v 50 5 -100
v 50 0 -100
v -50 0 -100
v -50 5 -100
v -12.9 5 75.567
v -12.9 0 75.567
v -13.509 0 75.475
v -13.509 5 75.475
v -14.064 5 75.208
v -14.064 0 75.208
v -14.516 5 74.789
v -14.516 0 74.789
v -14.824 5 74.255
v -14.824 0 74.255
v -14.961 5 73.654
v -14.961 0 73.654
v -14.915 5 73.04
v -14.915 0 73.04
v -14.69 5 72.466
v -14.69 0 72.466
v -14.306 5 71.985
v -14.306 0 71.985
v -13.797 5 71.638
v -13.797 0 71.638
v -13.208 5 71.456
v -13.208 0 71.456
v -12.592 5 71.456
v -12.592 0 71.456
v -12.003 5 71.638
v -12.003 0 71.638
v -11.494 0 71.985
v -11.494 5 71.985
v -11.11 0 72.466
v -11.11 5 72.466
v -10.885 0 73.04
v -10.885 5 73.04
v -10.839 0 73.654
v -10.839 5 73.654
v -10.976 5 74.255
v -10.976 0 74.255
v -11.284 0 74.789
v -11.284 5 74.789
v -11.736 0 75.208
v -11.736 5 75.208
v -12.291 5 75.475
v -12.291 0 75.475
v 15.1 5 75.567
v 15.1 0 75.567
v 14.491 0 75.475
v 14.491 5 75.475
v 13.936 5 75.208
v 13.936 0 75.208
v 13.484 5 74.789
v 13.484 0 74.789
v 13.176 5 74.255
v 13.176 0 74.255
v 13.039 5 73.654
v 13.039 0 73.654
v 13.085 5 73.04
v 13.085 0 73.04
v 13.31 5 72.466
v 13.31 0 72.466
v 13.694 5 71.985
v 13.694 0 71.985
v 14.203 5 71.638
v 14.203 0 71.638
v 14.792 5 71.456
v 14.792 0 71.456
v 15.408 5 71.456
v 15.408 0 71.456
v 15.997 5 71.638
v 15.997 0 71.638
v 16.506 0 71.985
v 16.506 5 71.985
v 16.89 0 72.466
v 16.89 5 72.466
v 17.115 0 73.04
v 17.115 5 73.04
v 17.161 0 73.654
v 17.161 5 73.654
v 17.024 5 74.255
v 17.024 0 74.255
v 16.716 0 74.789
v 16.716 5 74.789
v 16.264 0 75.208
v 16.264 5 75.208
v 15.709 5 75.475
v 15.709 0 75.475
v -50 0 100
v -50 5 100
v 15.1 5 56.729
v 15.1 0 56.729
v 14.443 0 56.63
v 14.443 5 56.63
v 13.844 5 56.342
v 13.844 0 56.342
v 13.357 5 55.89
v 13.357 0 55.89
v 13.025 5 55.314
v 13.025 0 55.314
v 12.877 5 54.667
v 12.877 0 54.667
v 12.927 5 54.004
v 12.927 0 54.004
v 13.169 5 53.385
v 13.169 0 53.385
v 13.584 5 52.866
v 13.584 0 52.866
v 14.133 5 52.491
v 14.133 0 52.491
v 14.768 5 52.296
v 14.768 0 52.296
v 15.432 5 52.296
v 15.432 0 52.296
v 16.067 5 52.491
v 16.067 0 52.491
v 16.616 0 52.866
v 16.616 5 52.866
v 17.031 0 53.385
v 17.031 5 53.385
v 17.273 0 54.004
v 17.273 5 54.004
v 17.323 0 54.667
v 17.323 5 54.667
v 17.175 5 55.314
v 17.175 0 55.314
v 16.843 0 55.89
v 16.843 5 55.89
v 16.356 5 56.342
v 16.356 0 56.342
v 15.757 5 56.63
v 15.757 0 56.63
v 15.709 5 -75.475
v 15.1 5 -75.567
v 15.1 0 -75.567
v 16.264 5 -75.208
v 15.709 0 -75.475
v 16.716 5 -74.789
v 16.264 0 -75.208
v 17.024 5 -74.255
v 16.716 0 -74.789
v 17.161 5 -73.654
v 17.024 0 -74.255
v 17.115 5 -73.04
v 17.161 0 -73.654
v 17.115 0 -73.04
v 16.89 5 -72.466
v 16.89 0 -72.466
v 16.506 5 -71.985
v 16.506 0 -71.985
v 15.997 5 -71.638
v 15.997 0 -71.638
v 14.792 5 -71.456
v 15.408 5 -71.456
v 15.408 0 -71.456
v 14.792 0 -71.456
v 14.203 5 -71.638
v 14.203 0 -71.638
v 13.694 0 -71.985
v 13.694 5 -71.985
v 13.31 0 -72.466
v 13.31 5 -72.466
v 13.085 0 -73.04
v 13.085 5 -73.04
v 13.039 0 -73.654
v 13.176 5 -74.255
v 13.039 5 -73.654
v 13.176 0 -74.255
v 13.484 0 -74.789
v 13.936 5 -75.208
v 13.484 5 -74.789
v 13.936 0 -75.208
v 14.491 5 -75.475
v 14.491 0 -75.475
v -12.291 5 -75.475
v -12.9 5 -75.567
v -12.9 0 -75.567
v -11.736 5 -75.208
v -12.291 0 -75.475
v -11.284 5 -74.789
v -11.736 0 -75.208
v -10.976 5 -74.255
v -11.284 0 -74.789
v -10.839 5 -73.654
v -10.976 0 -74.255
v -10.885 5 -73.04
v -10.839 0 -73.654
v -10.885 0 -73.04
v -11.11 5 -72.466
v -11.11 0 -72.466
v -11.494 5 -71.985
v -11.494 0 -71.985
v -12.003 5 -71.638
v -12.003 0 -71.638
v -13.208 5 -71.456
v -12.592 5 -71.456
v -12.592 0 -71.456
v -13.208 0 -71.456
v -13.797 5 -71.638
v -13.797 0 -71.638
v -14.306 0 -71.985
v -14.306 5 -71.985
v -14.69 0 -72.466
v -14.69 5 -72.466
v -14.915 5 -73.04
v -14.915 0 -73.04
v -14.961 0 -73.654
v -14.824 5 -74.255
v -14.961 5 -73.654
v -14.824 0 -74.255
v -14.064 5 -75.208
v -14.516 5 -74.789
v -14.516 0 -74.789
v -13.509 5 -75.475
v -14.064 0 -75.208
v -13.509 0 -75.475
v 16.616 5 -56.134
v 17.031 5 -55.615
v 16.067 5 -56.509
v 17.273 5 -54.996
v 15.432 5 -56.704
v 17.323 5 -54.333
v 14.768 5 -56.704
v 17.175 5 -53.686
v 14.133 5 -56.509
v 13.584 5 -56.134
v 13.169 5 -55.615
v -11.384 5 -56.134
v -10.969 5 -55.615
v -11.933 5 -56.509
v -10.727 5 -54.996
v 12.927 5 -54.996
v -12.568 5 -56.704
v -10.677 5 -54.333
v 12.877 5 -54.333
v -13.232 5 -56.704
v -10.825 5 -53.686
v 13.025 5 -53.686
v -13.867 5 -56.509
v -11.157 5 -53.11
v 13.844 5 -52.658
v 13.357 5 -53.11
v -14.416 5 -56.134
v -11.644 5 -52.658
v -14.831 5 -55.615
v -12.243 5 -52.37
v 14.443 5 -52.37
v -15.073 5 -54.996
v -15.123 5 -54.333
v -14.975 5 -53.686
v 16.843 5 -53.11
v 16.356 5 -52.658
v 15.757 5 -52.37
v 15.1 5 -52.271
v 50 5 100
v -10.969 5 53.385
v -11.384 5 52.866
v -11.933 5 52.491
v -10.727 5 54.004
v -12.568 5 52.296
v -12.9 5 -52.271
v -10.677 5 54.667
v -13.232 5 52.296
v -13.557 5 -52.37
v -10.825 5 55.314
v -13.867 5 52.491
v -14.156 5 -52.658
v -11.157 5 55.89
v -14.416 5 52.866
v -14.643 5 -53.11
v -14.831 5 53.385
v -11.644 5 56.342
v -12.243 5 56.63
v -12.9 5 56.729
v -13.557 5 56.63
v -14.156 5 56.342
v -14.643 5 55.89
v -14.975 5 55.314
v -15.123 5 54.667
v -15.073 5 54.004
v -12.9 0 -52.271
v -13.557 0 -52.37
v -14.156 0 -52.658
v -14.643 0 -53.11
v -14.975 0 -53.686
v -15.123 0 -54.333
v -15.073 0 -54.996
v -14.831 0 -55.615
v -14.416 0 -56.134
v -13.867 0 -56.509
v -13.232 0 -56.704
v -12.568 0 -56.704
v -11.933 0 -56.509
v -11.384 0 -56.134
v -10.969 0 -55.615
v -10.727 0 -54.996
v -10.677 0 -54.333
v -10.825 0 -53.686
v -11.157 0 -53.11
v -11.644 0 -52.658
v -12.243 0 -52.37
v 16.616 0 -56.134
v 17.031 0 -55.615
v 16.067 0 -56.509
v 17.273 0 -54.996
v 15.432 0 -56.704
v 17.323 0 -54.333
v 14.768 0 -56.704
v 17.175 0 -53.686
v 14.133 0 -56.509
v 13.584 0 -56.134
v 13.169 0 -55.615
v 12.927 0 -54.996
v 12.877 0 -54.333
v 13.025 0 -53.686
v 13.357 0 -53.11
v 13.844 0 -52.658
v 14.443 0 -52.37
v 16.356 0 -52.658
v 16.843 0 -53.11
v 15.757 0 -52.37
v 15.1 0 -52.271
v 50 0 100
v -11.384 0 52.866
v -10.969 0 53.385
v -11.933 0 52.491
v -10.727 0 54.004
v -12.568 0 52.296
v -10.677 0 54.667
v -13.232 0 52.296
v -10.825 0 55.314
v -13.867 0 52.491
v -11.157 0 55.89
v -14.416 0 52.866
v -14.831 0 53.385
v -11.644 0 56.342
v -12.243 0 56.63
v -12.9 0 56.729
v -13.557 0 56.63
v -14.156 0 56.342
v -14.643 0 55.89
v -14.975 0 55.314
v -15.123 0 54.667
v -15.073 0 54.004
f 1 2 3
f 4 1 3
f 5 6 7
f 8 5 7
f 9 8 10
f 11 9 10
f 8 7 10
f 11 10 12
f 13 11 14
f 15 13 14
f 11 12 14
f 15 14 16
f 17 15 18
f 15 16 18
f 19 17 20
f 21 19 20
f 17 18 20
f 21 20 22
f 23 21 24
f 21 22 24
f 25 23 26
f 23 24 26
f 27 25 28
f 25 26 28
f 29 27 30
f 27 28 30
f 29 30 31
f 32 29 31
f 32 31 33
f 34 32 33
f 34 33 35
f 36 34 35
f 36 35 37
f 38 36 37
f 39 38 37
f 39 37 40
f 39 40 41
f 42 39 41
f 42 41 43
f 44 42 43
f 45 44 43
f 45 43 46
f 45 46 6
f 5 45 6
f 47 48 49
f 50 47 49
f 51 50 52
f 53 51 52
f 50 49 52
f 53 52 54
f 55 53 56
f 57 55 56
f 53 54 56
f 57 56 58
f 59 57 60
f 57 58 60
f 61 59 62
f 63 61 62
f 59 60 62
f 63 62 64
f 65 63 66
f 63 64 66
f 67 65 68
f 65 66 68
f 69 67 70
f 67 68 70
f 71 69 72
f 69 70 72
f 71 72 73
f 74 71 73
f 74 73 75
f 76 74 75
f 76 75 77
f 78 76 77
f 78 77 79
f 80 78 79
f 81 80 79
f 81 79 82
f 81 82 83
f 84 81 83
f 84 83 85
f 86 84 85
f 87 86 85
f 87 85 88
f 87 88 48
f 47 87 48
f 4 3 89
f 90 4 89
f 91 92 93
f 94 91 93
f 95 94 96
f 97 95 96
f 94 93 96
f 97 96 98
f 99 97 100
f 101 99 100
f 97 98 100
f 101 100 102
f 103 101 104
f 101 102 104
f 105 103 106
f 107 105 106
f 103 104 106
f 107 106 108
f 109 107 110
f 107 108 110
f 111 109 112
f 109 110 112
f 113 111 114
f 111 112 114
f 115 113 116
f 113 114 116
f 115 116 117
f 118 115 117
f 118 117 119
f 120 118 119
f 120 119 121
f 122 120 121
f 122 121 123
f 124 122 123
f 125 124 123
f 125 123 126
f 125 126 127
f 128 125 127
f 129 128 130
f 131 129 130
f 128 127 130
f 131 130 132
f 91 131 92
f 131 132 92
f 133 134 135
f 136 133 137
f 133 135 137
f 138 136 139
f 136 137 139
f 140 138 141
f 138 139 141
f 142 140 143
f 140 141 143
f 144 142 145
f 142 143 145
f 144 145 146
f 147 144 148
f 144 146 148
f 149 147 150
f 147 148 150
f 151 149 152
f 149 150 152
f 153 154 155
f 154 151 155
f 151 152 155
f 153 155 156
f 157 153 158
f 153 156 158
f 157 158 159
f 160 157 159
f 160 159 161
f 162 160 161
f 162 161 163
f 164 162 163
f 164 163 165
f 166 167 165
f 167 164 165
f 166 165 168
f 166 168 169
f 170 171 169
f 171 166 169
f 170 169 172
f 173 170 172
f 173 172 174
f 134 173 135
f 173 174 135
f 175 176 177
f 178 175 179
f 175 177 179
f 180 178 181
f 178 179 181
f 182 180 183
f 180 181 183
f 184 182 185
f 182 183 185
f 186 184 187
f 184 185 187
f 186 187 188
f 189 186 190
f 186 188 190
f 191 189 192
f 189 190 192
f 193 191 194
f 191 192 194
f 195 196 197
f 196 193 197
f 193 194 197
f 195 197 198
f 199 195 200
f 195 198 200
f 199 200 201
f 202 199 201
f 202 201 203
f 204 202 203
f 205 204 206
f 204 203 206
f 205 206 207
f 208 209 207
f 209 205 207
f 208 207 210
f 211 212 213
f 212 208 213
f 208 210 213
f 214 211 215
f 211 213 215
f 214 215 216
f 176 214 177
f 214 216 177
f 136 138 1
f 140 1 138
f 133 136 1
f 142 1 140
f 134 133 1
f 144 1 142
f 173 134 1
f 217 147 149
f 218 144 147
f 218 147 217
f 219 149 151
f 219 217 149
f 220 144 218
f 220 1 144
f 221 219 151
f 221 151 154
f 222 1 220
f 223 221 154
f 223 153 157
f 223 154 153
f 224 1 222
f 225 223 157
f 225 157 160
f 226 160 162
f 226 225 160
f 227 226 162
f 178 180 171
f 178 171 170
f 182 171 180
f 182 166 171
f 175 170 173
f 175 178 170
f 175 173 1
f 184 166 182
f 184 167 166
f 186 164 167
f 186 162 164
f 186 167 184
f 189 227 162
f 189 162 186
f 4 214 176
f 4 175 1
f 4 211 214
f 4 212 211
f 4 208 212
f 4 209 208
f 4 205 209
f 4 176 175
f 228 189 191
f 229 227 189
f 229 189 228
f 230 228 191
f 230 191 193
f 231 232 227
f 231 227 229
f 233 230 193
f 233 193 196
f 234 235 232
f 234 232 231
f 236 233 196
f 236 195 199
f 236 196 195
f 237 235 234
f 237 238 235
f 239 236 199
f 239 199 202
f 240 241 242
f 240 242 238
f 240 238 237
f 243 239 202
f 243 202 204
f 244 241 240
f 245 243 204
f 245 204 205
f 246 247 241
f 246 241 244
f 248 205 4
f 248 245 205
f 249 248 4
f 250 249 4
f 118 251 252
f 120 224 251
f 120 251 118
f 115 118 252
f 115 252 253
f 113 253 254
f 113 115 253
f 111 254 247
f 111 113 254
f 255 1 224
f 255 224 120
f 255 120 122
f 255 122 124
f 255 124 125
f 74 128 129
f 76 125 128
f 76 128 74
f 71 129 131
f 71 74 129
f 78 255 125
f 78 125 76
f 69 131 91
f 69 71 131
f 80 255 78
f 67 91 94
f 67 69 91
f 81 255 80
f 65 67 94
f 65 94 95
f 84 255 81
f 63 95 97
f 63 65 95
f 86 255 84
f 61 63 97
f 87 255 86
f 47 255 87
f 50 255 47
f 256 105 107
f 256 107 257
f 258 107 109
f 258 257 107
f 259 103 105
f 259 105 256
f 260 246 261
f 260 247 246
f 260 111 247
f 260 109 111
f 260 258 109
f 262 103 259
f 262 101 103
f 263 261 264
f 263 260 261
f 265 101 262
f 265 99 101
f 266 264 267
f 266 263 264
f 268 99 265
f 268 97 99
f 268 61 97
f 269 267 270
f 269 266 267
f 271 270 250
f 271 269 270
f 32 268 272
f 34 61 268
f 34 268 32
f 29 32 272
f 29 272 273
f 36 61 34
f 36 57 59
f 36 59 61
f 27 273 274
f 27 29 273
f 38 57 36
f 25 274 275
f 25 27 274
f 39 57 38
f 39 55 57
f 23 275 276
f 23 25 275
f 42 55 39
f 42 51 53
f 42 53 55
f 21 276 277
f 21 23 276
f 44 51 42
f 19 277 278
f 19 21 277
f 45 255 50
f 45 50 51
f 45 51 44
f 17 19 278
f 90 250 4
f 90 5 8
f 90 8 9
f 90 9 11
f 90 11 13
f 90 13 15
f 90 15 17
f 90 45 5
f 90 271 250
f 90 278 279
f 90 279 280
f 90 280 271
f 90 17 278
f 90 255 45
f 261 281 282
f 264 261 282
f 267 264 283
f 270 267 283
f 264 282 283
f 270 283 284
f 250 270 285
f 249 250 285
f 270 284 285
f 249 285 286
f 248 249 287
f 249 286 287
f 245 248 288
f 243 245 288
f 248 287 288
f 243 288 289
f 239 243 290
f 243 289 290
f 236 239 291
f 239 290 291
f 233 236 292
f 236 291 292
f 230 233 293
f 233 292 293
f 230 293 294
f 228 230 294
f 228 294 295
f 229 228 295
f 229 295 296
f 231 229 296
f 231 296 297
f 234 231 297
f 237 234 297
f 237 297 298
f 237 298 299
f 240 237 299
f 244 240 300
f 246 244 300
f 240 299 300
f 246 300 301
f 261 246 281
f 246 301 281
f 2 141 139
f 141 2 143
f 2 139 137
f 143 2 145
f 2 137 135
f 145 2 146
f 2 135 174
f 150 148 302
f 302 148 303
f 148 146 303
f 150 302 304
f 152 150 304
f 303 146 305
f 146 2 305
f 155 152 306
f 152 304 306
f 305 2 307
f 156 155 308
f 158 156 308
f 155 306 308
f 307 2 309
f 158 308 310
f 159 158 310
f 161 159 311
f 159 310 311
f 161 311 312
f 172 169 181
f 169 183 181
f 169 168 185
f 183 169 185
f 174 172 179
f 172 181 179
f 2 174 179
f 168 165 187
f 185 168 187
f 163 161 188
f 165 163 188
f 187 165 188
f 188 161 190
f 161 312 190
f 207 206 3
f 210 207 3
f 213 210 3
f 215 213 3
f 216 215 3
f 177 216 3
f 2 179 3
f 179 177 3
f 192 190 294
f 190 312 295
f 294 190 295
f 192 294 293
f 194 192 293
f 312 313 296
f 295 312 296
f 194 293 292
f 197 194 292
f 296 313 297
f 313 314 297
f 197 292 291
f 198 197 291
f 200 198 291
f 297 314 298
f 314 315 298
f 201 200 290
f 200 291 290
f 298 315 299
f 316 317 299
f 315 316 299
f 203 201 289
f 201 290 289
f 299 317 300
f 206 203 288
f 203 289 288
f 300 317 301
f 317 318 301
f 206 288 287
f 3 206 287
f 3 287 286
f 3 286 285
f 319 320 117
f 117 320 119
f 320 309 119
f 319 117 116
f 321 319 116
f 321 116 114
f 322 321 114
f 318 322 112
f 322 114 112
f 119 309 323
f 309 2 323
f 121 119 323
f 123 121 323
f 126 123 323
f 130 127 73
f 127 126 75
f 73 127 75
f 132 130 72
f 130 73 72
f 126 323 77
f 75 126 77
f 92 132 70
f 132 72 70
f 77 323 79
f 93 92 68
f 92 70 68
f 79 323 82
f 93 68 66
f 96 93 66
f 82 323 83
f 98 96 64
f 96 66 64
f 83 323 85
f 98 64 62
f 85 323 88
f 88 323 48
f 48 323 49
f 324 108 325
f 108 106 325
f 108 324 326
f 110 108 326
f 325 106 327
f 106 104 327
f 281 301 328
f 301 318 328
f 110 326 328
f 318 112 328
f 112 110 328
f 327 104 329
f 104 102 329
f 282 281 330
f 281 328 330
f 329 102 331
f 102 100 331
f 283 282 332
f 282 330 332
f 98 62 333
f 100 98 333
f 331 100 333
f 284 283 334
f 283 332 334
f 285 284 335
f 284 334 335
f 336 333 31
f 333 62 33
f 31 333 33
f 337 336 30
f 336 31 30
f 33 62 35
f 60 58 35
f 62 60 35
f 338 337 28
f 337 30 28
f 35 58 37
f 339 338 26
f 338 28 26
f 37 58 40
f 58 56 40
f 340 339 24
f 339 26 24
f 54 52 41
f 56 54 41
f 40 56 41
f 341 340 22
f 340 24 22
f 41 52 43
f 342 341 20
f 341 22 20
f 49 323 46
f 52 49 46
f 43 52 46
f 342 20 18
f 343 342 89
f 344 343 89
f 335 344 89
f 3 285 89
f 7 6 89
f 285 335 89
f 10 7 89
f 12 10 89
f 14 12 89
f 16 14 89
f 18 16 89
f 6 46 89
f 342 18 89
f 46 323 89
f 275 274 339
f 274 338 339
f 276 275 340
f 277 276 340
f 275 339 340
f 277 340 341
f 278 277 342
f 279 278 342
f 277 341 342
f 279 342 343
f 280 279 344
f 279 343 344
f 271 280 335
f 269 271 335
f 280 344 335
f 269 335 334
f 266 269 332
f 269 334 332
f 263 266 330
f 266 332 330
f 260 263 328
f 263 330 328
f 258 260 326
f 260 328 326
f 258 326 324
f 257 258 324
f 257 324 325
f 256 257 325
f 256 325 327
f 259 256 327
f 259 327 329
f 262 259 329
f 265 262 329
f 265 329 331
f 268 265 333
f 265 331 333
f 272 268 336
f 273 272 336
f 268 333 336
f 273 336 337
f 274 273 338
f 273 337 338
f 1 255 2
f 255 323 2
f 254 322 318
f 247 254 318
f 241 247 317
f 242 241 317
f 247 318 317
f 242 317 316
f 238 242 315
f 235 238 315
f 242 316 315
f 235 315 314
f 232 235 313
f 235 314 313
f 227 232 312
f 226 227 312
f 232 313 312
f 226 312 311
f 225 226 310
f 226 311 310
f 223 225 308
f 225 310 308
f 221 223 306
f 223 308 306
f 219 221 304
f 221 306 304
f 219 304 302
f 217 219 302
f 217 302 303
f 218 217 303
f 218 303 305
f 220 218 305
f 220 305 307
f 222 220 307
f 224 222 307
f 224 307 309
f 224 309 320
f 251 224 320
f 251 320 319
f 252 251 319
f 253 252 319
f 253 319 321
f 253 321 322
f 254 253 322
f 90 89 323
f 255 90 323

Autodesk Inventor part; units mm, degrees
ref_plane "YZ Plane" through (0, 0, 0) normal (1, 0, 0) x (0, 1, 0)
ref_plane "XZ Plane" through (0, 0, 0) normal (0, 1, 0) x (-1, 0, 0)
ref_plane "XY Plane" through (0, 0, 0) normal (0, 0, 1) x (1, 0, 0)
sketch "Sketch1" plane through (0, 0, 0) normal (0, 1, 0) x (-1, 0, 0)
  line L0 (50, 100) -> (-50, 100)
  line L1 (-50, 100) -> (-50, -100)
  line L2 (-50, -100) -> (50, -100)
  line L3 (50, -100) -> (50, 100)
  line L4 (50, 100) -> (-50, -100) construction
  line L5 (-50, 100) -> (50, -100) construction
  point P0 (0, 0)
  dimension "d0" = 100
  dimension "d1" = 200
extrude "Extrusion1" add sketch "Sketch1" along normal blind 5
sketch "Sketch2" plane through (0, 5, 0) normal (0, 1, 0) x (1, 0, 0)
  line L0 (-34.6, -58) -> (34.6, -58)
  line L1 (34.6, -58) -> (34.6, 58)
  line L2 (34.6, 58) -> (-34.6, 58)
  line L3 (-34.6, 58) -> (-34.6, -58)
  line L4 (-34.6, -58) -> (34.6, 58) construction
  line L5 (34.6, -58) -> (-34.6, 58) construction
  circle A0 centre (-12.9, 54.5) radius 2.5
  circle A1 centre (15.1, 54.5) radius 2.5
  line L6 (0, 0) -> (-70, 0) construction
  line L7 (0, 0) -> (70, 0) construction
  circle A2 centre (-12.9, -54.5) radius 2.5
  circle A3 centre (15.1, -54.5) radius 2.5
  dimension "d4" = 69.2
  dimension "d5" = 116
  dimension "d6" = 19.5
  dimension "d7" = 28
  dimension "d8" = 3.5
  dimension "d9" = 3.5
  dimension "d10" = 5
  dimension "d11" = 5
  dimension "d12" = 70
  dimension "d13" = 180
hole "Hole1" at (-12.9, 5, 54.5) at (15.1, 5, 54.5) at (-12.9, 5, -54.5) at (15.1, 5, -54.5) direction (0, -1, 0) diameter 4.4587 end through all thread size "M5x0.5" class "6H" standard "ANSI Metric M Profile"
sketch "Sketch3" plane through (0, 5, 0) normal (0, 1, 0) x (1, 0, 0)
  line L0 (-34.6, -81) -> (34.6, -81)
  line L1 (34.6, -81) -> (34.6, 81)
  line L2 (34.6, 81) -> (-34.6, 81)
  line L3 (-34.6, 81) -> (-34.6, -81)
  line L4 (-34.6, -81) -> (34.6, 81) construction
  line L5 (34.6, -81) -> (-34.6, 81) construction
  point P0 (0, 0)
  point P1 (15.1, -73.5)
  point P2 (-12.9, -73.5)
  dimension "d21" = 69.2
  dimension "d22" = 162
  dimension "d23" = 7.5
  dimension "d24" = 7.5
  dimension "d25" = 28
  dimension "d26" = 19.5
hole "Hole2" at (15.1, 5, 73.5) at (-12.9, 5, 73.5) direction (0, -1, 0) diameter 4.134 end through all thread size "M5x0.8" class "6H" standard "ANSI Metric M Profile"
mirror "Mirror2" about plane through (0, 0, 0) normal (0, 0, 1) of "Hole2"
properties part number "Aluminum_Heatsink_Base"
